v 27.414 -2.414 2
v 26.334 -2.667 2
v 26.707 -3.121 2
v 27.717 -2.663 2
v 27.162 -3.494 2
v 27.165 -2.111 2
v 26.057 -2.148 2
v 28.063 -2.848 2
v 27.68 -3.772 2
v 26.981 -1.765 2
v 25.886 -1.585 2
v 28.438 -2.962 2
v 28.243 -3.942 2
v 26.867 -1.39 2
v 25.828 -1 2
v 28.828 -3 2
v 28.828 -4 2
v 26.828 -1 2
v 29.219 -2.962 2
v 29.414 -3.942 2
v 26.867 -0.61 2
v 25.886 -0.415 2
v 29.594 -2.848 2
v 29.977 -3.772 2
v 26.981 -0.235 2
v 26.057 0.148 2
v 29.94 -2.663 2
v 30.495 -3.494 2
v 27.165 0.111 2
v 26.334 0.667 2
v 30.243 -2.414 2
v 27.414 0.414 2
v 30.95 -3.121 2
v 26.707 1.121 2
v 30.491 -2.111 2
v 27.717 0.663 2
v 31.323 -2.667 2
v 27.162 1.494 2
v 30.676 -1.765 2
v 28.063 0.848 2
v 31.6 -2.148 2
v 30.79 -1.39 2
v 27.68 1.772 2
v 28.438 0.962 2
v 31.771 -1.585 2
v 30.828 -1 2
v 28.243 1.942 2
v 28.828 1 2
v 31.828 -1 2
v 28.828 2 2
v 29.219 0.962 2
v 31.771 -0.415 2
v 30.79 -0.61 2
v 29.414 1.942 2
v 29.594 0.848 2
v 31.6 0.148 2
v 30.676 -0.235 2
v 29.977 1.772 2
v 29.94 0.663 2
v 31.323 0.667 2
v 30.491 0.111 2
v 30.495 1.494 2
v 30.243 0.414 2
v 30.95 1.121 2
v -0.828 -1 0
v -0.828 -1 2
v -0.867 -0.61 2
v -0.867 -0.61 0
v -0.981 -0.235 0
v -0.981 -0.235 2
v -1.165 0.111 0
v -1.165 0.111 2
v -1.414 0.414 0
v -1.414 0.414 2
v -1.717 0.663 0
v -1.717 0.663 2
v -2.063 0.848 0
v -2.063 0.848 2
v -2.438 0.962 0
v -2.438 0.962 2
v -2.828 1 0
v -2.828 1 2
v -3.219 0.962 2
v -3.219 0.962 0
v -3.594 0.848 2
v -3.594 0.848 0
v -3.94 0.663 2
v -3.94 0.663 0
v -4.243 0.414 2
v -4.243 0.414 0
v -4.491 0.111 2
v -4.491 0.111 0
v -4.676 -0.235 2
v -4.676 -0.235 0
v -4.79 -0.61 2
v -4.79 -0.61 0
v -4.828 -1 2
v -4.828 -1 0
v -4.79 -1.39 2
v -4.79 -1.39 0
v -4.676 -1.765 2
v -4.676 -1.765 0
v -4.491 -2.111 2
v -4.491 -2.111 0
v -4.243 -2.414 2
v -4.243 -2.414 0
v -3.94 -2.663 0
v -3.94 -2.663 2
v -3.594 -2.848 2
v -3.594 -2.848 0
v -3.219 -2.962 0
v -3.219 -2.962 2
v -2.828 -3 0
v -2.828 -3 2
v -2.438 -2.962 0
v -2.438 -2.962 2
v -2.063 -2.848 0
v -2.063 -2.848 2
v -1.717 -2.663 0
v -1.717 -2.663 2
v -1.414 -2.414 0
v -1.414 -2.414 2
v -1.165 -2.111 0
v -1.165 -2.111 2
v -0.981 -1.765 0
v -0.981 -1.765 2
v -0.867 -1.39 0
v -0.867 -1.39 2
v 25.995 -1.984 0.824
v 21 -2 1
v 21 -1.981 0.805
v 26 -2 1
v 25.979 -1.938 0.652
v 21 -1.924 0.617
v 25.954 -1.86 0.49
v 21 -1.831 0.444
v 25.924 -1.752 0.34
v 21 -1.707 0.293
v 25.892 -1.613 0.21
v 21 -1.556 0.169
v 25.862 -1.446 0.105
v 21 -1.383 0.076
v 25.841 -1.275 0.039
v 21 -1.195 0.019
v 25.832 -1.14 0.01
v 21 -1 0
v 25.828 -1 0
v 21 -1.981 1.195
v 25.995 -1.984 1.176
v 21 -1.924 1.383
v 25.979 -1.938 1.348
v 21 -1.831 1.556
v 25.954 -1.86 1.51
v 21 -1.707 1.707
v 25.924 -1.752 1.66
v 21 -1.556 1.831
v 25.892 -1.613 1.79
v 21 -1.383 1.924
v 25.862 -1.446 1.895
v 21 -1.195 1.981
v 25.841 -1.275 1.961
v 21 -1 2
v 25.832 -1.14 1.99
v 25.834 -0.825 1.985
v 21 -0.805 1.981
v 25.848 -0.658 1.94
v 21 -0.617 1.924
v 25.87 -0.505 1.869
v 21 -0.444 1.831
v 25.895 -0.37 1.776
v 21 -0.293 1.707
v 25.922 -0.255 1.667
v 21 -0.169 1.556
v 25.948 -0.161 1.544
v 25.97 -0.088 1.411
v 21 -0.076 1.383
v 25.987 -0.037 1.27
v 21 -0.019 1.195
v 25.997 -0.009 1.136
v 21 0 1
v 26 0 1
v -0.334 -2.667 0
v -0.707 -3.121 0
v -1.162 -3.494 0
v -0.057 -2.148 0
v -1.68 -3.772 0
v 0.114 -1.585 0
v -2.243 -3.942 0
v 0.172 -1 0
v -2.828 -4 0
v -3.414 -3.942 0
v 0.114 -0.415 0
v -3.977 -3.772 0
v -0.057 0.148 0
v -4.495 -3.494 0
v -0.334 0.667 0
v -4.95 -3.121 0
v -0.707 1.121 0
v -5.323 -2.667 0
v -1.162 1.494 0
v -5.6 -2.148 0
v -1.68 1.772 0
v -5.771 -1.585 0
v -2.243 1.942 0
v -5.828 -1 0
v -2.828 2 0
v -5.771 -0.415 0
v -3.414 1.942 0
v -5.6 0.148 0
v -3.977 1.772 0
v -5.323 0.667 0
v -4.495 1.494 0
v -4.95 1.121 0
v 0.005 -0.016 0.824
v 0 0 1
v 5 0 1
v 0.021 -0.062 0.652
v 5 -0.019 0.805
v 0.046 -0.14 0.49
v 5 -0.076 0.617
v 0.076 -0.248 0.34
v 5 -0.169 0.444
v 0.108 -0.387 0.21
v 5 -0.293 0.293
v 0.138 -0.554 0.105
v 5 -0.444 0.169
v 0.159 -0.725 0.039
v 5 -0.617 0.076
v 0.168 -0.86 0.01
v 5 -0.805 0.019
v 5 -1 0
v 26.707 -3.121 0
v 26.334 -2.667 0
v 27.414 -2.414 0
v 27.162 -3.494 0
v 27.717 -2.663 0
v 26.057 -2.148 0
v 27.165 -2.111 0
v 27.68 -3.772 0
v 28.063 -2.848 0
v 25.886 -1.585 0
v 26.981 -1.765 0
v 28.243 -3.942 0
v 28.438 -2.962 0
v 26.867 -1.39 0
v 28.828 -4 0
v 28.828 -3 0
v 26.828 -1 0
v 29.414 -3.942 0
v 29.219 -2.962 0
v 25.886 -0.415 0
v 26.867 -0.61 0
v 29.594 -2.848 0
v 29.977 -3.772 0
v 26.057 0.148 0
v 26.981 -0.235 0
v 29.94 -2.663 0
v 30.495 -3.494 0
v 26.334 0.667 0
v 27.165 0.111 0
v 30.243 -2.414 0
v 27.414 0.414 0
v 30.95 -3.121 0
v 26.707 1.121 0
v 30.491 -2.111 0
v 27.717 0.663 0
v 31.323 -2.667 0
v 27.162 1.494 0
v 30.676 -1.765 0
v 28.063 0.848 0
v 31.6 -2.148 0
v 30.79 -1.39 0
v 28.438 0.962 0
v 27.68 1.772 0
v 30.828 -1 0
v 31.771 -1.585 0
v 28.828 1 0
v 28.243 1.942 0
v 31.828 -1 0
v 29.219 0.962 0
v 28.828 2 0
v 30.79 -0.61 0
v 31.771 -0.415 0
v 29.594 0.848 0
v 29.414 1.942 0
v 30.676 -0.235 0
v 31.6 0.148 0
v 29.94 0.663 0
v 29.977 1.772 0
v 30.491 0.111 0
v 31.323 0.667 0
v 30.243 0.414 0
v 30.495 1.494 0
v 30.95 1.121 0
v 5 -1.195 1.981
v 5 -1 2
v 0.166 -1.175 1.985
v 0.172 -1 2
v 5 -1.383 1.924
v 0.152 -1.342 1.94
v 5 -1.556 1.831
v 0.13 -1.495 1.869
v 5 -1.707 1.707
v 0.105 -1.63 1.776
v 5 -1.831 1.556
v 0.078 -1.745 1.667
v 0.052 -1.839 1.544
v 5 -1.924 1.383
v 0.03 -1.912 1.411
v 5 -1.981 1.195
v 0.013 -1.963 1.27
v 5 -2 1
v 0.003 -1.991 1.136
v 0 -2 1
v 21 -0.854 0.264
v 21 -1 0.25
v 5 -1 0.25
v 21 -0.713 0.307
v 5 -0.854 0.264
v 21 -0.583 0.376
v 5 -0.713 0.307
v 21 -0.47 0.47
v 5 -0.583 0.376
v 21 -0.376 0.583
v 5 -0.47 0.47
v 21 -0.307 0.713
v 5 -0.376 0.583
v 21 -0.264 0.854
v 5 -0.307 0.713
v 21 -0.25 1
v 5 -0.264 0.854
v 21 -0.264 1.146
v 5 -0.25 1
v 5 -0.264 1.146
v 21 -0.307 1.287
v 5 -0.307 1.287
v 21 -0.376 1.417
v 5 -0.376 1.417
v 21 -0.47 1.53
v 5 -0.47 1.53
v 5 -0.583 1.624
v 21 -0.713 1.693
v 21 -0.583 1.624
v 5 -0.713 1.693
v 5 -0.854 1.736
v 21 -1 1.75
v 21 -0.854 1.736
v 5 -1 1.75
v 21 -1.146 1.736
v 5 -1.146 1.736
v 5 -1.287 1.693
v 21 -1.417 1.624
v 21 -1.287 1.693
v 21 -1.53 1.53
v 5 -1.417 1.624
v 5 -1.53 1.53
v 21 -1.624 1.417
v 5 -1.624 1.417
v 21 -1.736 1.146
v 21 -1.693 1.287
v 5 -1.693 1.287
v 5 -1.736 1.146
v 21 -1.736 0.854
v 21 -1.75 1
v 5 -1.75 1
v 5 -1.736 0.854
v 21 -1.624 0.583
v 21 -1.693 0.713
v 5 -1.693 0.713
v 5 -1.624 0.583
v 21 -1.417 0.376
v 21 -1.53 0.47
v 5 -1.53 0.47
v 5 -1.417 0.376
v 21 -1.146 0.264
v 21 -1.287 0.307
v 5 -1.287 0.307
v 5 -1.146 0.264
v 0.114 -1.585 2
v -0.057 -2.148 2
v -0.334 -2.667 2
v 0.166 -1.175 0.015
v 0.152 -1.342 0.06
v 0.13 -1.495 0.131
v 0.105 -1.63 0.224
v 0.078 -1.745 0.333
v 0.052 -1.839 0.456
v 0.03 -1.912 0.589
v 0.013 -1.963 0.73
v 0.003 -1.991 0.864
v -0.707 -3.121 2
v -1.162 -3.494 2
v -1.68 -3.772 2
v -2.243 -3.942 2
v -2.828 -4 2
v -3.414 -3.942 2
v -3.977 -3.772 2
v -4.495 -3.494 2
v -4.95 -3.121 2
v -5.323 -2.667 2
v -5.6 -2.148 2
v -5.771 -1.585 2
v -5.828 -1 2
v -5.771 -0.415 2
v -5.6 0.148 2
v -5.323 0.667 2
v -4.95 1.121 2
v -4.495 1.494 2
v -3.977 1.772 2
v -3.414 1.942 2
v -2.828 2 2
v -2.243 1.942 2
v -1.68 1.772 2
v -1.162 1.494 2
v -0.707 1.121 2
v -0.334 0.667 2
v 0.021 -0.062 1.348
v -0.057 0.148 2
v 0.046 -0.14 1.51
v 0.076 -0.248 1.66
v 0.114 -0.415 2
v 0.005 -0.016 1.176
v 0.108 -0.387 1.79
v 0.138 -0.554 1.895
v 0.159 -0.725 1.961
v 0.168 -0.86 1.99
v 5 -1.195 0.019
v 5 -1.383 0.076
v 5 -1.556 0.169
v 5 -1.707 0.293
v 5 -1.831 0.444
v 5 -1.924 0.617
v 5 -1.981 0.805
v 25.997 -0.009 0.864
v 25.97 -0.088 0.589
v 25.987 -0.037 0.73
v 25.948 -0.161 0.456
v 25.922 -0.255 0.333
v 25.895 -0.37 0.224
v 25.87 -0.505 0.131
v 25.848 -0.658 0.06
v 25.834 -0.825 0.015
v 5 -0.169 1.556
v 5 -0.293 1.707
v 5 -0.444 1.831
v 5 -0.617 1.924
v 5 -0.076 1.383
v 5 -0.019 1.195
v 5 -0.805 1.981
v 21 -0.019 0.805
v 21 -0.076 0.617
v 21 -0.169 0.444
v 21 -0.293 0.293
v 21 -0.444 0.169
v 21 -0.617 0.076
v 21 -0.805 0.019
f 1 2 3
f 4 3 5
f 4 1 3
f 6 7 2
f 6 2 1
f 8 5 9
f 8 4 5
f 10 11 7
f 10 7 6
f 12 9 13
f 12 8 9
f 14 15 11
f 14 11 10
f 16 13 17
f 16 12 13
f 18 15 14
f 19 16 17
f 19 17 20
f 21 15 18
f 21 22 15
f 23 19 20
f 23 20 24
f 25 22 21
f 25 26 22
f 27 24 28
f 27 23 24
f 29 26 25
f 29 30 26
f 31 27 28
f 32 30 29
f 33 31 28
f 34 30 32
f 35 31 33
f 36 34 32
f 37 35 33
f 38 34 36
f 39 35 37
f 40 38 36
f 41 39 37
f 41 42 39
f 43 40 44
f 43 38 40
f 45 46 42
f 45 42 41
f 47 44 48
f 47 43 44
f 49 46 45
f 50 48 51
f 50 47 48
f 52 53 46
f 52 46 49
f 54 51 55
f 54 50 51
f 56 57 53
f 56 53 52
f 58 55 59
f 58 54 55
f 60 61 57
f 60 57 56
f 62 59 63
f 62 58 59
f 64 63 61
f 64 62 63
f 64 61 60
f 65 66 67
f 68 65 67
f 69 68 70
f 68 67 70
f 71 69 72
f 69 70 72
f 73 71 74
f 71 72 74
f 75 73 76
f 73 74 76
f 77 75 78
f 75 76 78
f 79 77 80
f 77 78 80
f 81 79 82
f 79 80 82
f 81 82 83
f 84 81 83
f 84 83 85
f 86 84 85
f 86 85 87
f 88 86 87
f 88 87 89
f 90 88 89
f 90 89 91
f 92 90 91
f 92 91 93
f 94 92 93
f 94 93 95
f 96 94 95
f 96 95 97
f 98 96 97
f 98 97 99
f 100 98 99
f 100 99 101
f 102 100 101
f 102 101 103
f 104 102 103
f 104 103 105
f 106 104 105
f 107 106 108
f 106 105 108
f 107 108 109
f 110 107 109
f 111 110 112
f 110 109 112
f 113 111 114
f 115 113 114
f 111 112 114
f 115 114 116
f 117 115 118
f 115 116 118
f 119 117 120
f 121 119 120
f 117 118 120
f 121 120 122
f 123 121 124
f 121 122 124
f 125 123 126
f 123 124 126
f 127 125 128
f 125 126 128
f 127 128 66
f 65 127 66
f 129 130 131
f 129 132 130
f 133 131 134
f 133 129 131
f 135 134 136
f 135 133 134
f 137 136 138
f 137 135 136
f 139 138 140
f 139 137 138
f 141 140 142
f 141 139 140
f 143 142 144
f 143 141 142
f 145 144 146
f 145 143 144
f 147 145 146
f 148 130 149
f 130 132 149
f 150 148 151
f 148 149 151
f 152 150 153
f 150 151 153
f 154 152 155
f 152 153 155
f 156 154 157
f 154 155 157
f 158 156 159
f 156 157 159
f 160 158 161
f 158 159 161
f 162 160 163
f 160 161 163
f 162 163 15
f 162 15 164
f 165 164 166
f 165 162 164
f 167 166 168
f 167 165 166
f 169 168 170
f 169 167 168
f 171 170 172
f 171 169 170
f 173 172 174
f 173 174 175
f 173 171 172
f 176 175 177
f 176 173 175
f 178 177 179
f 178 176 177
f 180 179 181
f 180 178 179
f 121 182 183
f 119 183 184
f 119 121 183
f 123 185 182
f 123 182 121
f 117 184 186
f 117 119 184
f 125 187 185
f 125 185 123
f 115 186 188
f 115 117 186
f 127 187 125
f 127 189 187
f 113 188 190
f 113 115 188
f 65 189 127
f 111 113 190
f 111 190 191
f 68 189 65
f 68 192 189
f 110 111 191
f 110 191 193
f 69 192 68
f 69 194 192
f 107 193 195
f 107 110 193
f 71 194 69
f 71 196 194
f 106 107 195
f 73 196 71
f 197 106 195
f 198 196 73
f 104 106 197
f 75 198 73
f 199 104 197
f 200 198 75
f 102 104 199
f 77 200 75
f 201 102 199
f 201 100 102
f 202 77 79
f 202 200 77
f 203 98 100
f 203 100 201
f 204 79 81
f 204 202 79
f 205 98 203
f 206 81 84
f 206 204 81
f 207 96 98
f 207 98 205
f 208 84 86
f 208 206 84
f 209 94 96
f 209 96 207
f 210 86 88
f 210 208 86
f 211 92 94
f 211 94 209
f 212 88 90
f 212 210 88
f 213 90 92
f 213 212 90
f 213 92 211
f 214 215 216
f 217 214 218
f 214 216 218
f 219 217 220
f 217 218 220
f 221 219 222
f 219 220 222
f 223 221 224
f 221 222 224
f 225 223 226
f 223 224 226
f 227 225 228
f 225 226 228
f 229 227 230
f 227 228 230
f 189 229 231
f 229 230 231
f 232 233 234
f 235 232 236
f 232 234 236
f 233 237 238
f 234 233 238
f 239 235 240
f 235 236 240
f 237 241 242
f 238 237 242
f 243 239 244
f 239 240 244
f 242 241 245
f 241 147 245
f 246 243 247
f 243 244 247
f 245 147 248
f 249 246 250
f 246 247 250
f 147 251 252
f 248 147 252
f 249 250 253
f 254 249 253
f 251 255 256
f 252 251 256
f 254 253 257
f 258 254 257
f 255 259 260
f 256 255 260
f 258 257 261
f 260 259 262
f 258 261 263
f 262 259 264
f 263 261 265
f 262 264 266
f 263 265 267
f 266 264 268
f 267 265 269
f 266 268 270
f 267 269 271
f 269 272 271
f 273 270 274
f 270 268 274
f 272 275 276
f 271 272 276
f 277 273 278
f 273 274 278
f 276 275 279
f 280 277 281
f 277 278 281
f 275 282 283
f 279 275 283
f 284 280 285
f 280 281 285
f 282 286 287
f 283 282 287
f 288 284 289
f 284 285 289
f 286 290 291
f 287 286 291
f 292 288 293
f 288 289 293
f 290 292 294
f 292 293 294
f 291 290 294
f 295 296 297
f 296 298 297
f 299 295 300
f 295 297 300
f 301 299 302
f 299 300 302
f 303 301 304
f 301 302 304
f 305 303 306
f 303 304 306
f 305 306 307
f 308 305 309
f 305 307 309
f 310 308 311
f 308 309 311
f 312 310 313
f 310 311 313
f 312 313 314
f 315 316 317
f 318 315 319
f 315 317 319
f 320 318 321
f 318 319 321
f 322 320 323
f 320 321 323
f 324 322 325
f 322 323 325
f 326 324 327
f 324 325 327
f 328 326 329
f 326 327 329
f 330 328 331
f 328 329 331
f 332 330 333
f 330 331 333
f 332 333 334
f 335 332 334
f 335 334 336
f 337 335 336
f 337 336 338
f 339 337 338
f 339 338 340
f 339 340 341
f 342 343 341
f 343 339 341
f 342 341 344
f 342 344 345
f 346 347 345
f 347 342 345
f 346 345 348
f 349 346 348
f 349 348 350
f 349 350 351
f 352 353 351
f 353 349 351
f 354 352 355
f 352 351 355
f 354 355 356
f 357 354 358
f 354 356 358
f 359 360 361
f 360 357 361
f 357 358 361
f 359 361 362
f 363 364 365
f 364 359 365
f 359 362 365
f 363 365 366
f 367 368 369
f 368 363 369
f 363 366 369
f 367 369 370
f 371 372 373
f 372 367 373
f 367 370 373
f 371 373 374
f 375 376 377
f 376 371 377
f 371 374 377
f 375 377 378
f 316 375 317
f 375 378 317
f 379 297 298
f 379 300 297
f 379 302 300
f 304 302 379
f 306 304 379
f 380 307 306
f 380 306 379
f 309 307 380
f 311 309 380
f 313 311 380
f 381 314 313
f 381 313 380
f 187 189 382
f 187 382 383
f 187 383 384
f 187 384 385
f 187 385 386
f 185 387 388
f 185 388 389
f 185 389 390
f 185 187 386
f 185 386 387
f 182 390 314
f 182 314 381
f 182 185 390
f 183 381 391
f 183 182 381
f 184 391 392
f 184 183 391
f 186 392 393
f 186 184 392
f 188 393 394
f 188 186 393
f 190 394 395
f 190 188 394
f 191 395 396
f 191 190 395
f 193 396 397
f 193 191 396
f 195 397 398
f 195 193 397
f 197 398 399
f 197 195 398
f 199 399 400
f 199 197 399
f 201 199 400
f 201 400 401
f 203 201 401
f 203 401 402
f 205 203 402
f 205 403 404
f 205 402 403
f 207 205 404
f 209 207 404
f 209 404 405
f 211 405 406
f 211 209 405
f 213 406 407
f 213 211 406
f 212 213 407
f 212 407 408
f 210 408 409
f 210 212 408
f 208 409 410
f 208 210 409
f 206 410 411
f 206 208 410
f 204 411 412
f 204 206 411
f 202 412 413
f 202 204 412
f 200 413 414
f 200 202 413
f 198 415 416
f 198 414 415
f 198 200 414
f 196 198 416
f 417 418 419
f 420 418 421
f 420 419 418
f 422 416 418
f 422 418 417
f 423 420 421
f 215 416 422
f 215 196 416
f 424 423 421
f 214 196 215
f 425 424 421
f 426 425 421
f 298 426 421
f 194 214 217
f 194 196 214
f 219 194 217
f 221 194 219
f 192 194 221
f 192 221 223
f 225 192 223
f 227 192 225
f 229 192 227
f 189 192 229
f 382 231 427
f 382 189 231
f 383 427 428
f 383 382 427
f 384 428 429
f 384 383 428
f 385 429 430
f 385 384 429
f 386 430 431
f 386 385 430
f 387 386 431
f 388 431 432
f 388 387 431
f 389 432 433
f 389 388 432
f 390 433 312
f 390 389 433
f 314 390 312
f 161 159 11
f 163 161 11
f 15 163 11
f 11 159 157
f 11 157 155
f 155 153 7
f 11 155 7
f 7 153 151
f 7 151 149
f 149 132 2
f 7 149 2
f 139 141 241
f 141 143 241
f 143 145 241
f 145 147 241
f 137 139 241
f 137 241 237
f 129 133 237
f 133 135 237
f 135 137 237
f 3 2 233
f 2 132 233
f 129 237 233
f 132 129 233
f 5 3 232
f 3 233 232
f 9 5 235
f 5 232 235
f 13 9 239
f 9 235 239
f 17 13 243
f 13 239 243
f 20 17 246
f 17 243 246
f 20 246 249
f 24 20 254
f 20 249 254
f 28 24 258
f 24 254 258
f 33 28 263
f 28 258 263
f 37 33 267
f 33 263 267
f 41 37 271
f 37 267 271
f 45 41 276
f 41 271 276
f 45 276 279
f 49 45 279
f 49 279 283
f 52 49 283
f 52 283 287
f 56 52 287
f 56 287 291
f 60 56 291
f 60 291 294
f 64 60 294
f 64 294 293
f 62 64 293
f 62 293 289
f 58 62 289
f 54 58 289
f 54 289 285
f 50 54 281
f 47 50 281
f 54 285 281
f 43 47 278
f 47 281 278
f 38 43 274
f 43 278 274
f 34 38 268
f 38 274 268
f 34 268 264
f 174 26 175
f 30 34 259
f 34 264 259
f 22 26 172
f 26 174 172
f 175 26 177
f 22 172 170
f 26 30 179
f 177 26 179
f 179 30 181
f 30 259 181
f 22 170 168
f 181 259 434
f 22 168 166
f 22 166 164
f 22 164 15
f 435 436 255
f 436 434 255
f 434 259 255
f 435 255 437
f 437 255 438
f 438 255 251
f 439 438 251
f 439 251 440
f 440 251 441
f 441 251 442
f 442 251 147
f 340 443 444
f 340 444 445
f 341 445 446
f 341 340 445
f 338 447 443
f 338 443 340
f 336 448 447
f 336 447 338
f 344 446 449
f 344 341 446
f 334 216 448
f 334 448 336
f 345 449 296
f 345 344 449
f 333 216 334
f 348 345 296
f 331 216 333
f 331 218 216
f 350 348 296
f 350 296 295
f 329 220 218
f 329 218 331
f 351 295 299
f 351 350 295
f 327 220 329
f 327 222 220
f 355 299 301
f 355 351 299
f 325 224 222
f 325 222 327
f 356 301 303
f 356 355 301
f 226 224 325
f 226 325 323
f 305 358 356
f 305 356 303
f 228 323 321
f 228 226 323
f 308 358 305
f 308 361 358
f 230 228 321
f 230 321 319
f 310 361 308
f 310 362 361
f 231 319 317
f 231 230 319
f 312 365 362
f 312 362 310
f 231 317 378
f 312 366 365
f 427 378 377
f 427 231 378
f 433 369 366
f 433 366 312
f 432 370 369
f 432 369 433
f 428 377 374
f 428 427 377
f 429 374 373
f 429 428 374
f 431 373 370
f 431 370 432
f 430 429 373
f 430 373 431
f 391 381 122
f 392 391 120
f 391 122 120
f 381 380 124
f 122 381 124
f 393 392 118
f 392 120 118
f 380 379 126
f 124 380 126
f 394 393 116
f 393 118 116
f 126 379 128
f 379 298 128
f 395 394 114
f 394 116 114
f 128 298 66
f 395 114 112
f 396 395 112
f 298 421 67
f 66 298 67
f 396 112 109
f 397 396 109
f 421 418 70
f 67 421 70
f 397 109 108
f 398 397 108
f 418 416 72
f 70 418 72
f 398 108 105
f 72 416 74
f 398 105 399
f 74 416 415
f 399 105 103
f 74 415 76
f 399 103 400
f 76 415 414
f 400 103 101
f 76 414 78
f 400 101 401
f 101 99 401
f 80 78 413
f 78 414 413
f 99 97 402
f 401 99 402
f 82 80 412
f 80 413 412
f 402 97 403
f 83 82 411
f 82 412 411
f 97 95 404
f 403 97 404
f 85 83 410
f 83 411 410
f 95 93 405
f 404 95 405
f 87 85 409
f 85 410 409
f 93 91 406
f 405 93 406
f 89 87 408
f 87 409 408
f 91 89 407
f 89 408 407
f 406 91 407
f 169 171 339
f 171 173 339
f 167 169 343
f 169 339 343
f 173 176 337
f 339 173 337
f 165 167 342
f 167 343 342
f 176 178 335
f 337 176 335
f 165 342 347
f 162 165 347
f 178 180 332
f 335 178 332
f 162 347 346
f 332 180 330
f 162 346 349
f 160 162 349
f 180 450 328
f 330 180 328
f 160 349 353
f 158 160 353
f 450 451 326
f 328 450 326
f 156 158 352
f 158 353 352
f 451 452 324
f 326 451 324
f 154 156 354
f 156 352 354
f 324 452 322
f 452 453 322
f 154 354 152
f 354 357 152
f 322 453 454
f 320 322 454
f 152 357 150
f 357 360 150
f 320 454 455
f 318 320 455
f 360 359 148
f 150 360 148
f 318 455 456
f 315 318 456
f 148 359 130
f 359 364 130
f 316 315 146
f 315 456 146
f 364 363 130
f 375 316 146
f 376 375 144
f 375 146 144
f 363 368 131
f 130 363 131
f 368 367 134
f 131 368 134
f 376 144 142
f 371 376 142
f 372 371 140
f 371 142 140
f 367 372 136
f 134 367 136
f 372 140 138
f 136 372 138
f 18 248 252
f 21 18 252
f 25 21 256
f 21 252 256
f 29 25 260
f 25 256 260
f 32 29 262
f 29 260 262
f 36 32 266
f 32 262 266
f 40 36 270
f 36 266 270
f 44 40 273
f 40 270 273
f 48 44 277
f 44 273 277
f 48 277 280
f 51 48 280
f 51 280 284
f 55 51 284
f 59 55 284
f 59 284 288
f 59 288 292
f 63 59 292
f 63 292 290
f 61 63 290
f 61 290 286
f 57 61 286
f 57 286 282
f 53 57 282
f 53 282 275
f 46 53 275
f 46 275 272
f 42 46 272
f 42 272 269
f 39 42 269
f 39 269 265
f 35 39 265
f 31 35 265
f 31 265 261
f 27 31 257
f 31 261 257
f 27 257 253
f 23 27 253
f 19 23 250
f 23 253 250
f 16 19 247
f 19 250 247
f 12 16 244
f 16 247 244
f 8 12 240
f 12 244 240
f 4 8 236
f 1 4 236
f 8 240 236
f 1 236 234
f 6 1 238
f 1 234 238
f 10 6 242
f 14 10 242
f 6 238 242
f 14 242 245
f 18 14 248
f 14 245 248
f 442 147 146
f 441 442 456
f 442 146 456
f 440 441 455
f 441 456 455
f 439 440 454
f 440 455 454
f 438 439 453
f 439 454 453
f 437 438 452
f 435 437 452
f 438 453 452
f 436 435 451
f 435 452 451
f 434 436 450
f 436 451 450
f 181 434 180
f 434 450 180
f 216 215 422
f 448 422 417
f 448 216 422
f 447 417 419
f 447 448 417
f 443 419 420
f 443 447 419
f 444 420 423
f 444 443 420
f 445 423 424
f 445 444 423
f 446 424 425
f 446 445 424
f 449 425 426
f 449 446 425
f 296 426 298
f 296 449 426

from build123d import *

# Parameters (mm, degrees)
EXTRUDE_1_DEPTH     = 2
SKETCH_3_R          = 0.75
EXTRUDE_2_DEPTH     = 20
SKETCH_6_R          = 2
CUT_EXTRUDE_1_DEPTH = 20
SKETCH_7_R          = 2
CUT_EXTRUDE_2_DEPTH = 20
FILLET_2_R          = 1
FILLET_3_R          = 1


with BuildPart() as part:
    # 草图2 → 凸台-拉伸1 (new body)
    with BuildSketch(Plane.XY):
        with BuildLine():
            Line((0, 0), (5, 0))
            Line((5, 0), (5, -2))
            Line((5, -2), (0, -2))
            ThreePointArc((0, -2), (-5.828427125, -1), (0, 0))
        make_face()
    extrude_1 = extrude(amount=EXTRUDE_1_DEPTH)

    # 草图3 → 凸台-拉伸2 (add)
    with BuildSketch(Plane(origin=(5, 0, 0), x_dir=(0, 0, -1), z_dir=(1, 0, 0))):
        with Locations((-1, -1)):
            Circle(SKETCH_3_R)
    extrude(amount=EXTRUDE_2_DEPTH)

    # 草图6 → 切除-拉伸1 (cut)
    with BuildSketch(Plane.XY.offset(2)):
        with Locations((-2.828427125, -1)):
            Circle(SKETCH_6_R)
    extrude(amount=-CUT_EXTRUDE_1_DEPTH, mode=Mode.SUBTRACT)

    # 镜向9: 凸台-拉伸1 across plane
    add(extrude_1.mirror(Plane(origin=(13, 0, 0), x_dir=(0, 0, 1), z_dir=(1, 0, 0))))

    # 草图7 → 切除-拉伸2 (cut)
    with BuildSketch(Plane(origin=(0, 0, 0), x_dir=(-1, 0, 0), z_dir=(0, 0, -1))):
        with Locations((-28.828427125, -1)):
            Circle(SKETCH_7_R)
    extrude(amount=-CUT_EXTRUDE_2_DEPTH, mode=Mode.SUBTRACT)

    # 圆角2
    fillet_2_edges = [part.edges().sort_by_distance(p)[0] for p in [
        (2.5, -2, 2),
        (2.5, -2, 0),
        (2.5, 0, 0),
        (2.5, 0, 2),
    ]]
    fillet(fillet_2_edges, radius=FILLET_2_R - 0.0001)  # a hair under: the kernel refuses the full size

    # 圆角3
    fillet_3_edges = [part.edges().sort_by_distance(p)[0] for p in [
        (23.5, -2, 2),
        (23.5, -2, 0),
        (23.5, 0, 0),
        (23.5, 0, 2),
    ]]
    fillet(fillet_3_edges, radius=FILLET_3_R - 0.0001)  # a hair under: the kernel refuses the full size


solid = part.part
